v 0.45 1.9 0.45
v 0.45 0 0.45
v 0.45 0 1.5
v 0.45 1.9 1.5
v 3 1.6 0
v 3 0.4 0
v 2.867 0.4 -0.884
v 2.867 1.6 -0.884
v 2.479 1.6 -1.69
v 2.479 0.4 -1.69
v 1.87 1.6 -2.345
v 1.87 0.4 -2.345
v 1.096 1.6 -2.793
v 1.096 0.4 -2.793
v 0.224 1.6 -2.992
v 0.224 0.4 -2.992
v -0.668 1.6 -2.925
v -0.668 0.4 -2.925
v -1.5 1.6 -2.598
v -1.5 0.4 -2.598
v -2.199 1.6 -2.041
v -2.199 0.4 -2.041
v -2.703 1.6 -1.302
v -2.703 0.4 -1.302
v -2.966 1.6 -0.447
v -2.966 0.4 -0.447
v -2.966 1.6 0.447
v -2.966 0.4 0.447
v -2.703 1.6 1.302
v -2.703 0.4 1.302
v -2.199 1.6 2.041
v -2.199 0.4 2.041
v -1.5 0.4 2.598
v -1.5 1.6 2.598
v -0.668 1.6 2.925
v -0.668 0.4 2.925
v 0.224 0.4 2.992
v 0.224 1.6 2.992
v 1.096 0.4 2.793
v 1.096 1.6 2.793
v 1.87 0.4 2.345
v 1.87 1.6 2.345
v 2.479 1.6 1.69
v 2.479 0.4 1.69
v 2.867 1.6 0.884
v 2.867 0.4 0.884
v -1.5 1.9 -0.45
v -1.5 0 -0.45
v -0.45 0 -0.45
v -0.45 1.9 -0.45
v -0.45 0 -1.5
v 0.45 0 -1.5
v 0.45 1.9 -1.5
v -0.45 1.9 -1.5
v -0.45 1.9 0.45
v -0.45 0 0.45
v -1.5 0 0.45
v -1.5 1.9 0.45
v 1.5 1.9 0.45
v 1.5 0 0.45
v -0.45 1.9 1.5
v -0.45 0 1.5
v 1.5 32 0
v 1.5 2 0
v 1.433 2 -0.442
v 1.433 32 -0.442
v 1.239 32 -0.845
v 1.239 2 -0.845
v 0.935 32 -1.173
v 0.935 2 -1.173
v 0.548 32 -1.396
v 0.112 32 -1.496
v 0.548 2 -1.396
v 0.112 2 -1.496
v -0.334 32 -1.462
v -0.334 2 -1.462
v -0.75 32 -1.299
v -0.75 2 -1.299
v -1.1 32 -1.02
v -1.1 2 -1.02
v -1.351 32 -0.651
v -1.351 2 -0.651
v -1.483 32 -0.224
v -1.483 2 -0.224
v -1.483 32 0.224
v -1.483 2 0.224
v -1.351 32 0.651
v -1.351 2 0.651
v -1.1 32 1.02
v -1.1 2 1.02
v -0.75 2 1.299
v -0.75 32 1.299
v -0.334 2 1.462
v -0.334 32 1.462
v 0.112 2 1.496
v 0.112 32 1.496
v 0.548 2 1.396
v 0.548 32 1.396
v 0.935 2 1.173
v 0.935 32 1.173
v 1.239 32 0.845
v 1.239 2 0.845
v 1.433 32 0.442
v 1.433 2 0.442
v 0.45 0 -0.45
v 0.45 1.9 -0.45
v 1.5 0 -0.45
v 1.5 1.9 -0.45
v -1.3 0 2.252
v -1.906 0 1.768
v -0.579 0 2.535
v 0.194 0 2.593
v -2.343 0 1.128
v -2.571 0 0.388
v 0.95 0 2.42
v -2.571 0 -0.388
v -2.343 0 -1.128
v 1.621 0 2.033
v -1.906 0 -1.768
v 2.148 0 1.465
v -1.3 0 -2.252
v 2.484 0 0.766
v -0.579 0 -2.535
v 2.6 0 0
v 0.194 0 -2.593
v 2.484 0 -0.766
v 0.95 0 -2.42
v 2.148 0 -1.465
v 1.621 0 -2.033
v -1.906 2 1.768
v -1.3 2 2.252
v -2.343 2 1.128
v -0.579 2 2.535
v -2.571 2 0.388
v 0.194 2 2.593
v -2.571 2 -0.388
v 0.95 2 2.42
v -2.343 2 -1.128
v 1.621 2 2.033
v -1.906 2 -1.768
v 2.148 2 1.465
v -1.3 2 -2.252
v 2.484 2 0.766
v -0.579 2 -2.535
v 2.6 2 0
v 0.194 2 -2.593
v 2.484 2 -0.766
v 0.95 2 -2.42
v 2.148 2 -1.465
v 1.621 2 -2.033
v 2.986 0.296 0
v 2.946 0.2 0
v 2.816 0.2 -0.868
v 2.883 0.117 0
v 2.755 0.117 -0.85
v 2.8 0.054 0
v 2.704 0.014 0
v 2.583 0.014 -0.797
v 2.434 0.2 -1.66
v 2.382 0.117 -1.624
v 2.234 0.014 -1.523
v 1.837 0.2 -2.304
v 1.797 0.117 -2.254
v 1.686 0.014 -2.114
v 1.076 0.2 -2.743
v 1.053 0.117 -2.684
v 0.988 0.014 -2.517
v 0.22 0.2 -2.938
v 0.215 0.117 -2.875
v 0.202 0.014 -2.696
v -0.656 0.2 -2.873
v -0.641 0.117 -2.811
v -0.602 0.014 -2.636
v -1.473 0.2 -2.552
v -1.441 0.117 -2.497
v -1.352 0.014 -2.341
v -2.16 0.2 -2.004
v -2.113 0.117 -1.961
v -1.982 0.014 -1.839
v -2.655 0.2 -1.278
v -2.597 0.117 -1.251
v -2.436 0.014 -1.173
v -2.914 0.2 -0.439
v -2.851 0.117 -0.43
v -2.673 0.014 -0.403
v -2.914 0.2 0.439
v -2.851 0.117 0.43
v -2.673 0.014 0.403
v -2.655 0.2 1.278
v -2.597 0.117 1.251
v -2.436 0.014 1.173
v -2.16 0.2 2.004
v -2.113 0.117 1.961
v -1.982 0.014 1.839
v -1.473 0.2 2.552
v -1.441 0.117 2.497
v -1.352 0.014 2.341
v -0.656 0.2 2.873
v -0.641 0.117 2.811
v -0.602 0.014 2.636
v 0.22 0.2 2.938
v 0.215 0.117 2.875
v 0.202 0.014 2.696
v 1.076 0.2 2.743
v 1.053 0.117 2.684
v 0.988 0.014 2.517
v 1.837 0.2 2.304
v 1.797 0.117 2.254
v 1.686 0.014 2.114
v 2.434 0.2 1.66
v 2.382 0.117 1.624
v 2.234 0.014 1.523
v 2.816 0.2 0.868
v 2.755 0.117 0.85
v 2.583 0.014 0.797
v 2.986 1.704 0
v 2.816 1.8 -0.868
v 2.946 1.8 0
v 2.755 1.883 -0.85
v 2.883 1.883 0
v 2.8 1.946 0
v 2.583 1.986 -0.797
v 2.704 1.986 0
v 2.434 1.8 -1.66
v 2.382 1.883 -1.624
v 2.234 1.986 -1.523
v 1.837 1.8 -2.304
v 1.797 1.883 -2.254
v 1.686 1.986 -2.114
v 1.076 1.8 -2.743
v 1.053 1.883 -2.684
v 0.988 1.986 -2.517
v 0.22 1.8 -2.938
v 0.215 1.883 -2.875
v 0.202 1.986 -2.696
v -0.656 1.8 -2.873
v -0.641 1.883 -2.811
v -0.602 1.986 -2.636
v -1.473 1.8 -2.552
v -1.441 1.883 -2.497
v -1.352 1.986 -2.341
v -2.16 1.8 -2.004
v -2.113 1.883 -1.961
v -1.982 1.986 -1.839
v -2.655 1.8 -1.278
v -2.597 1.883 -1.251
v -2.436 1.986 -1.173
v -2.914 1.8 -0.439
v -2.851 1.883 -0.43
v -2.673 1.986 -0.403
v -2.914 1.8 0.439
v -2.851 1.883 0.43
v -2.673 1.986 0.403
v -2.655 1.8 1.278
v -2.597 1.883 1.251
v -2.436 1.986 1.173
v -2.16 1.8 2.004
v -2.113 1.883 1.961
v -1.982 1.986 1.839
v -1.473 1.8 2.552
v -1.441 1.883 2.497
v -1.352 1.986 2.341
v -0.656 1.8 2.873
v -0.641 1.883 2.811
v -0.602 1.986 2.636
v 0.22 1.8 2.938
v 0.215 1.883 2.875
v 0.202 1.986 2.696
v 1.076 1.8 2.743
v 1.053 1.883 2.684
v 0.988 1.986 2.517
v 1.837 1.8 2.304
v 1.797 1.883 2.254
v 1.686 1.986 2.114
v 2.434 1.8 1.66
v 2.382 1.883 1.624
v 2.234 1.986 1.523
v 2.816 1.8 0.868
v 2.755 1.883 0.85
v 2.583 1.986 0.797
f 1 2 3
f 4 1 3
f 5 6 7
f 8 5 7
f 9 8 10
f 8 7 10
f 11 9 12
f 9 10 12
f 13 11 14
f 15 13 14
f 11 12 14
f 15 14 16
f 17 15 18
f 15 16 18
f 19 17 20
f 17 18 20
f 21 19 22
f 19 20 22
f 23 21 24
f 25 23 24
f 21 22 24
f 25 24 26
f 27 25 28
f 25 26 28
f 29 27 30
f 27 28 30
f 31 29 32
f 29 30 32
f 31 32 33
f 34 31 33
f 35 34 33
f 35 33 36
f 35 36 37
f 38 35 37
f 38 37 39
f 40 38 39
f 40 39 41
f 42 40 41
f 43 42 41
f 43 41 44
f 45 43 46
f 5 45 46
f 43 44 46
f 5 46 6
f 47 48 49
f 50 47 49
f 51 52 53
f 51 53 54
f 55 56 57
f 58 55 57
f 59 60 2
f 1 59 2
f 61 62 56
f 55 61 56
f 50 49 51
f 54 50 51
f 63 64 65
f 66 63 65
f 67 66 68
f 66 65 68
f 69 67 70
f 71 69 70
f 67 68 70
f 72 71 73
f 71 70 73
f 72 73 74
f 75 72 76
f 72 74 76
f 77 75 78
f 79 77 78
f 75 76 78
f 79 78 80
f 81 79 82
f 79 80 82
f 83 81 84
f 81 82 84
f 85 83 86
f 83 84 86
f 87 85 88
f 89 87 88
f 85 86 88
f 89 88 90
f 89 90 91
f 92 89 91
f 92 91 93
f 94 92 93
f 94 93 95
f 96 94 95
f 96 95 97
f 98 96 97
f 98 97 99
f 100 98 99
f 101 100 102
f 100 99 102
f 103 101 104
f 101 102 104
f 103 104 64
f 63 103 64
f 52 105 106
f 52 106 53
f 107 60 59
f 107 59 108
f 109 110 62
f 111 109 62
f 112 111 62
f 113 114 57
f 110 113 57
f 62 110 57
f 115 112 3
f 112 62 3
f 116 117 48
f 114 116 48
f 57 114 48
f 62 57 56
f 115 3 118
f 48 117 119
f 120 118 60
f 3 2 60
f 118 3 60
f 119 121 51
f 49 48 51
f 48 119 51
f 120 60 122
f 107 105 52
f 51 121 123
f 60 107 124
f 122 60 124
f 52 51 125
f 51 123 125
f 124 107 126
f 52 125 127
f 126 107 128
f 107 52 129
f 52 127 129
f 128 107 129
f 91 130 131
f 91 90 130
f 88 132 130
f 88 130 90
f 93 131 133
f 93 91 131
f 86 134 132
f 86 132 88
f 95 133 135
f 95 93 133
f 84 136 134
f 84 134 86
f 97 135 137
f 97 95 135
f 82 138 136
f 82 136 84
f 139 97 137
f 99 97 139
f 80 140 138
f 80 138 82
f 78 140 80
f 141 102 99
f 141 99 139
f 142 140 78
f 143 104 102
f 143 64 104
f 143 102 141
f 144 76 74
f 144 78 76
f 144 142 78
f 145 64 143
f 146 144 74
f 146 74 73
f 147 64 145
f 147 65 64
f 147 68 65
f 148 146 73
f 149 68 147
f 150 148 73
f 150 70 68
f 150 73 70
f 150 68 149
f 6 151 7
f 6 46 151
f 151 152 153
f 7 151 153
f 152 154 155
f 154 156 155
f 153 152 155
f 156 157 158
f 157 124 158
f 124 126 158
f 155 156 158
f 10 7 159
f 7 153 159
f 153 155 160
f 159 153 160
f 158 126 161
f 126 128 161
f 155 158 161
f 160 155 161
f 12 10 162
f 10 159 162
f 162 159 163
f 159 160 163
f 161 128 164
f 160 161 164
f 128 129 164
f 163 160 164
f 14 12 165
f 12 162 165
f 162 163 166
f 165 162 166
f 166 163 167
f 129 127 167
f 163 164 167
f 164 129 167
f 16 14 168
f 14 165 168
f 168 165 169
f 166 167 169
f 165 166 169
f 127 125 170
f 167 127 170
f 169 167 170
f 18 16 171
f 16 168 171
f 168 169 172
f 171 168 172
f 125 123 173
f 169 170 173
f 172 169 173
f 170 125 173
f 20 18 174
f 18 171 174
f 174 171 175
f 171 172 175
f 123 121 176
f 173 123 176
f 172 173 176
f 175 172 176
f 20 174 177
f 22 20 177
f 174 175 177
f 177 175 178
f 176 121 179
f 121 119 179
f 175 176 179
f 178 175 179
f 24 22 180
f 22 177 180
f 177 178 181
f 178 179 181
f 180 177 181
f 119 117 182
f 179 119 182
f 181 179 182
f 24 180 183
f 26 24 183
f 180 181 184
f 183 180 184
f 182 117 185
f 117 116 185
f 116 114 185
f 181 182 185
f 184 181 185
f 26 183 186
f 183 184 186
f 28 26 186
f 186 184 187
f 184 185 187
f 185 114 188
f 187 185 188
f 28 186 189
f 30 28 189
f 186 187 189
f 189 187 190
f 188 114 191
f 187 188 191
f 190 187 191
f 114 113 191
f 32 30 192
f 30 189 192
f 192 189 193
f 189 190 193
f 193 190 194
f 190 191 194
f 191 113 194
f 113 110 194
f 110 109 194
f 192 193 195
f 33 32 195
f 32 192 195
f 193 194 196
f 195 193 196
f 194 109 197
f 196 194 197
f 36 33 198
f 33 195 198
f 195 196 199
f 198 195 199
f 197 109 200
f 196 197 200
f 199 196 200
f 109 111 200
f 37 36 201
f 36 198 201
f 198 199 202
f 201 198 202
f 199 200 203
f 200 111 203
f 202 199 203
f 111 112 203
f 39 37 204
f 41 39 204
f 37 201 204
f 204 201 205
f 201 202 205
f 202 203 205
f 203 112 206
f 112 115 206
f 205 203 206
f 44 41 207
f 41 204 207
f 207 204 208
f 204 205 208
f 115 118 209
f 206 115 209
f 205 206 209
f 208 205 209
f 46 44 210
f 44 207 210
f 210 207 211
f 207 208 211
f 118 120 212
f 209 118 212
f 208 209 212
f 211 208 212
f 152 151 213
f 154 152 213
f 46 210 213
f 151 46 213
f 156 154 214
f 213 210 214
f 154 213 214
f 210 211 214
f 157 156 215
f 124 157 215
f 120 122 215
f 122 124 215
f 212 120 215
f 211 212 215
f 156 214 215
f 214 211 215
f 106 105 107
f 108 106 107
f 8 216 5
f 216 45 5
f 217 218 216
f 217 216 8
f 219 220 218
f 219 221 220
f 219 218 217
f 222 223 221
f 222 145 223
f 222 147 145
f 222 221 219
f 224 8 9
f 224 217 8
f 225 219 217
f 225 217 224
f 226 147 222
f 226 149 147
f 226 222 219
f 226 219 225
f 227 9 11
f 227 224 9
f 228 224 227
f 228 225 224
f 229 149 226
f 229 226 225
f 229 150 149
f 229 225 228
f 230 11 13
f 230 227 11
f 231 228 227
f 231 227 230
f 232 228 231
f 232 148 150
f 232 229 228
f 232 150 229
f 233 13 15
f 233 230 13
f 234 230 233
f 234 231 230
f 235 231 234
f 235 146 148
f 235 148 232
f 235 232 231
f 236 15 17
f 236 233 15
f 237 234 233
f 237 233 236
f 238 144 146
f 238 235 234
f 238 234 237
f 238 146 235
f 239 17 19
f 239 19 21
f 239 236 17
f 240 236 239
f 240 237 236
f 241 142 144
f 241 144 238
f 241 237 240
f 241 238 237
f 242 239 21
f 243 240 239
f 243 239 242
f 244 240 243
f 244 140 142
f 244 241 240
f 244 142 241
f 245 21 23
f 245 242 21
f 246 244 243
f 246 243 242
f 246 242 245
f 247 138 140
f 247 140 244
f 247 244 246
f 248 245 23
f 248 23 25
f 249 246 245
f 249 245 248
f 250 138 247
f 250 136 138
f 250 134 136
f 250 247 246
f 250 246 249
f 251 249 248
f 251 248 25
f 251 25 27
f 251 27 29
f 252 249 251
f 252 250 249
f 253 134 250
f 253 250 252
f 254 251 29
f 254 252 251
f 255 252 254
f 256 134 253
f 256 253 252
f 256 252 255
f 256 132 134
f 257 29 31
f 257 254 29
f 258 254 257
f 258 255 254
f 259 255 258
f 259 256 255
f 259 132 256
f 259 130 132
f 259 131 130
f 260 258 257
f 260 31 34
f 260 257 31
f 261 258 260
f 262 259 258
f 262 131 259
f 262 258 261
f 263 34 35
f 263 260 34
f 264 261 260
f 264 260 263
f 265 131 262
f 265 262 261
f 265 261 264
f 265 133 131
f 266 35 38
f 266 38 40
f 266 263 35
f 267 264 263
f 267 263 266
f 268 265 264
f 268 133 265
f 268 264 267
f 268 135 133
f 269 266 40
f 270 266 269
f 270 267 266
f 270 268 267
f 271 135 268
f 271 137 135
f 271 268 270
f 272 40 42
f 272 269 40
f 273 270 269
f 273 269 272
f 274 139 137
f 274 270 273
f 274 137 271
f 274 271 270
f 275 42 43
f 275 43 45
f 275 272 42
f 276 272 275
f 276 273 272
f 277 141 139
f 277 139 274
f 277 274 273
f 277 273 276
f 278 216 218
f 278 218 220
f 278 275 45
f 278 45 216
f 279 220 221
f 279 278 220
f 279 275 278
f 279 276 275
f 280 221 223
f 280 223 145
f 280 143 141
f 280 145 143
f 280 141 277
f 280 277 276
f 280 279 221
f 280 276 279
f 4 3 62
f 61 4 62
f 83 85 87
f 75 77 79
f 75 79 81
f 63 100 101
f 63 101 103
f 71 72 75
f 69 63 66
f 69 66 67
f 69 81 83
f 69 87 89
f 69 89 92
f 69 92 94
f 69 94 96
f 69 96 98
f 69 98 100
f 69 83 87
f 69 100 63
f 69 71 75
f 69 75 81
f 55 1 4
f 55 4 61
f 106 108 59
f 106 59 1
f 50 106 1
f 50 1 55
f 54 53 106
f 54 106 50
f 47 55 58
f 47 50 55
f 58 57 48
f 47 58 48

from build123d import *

# Parameters (mm, degrees)
SKETCH1_R           = 3
BOSS_EXTRUDE1_DEPTH = 2
SKETCH2_R           = 1.5
BOSS_EXTRUDE2_DEPTH = 30
SKETCH3_W           = 0.9
SKETCH3_H           = 0.9
SKETCH3_W_2         = 1.05
SKETCH3_H_2         = 1.05
CUT_EXTRUDE1_DEPTH  = 1.9
FILLET1_R           = 0.4


with BuildPart() as part:
    # Sketch1 → Boss-Extrude1 (new body)
    with BuildSketch(Plane(origin=(0, 0, 0), x_dir=(1, 0, 0), z_dir=(0, 1, 0))):
        Circle(SKETCH1_R)
    extrude(amount=BOSS_EXTRUDE1_DEPTH)

    # Sketch2 → Boss-Extrude2 (add)
    with BuildSketch(Plane(origin=(0, 2, 0), x_dir=(1, 0, 0), z_dir=(0, 1, 0))):
        Circle(SKETCH2_R)
    extrude(amount=BOSS_EXTRUDE2_DEPTH)

    # Sketch3 → Cut-Extrude1 (cut)
    with BuildSketch(Plane(origin=(0, 0, 0), x_dir=(-1, 0, 0), z_dir=(0, -1, 0))):
        Rectangle(SKETCH3_W, SKETCH3_H)
        with Locations((0.975, 0)):
            Rectangle(SKETCH3_W_2, SKETCH3_H)
        with Locations((0, -0.975)):
            Rectangle(SKETCH3_W, SKETCH3_H_2)
        with Locations((-0.975, 0)):
            Rectangle(SKETCH3_W_2, SKETCH3_H)
        with Locations((0, 0.975)):
            Rectangle(SKETCH3_W, SKETCH3_H_2)
    extrude(amount=-CUT_EXTRUDE1_DEPTH, mode=Mode.SUBTRACT)

    # Fillet1
    fillet1_edges = [part.edges().sort_by_distance(p)[0] for p in [
        (-3, 0, 0),
        (-3, 2, 0),
    ]]
    fillet(fillet1_edges, radius=FILLET1_R)


solid = part.part
